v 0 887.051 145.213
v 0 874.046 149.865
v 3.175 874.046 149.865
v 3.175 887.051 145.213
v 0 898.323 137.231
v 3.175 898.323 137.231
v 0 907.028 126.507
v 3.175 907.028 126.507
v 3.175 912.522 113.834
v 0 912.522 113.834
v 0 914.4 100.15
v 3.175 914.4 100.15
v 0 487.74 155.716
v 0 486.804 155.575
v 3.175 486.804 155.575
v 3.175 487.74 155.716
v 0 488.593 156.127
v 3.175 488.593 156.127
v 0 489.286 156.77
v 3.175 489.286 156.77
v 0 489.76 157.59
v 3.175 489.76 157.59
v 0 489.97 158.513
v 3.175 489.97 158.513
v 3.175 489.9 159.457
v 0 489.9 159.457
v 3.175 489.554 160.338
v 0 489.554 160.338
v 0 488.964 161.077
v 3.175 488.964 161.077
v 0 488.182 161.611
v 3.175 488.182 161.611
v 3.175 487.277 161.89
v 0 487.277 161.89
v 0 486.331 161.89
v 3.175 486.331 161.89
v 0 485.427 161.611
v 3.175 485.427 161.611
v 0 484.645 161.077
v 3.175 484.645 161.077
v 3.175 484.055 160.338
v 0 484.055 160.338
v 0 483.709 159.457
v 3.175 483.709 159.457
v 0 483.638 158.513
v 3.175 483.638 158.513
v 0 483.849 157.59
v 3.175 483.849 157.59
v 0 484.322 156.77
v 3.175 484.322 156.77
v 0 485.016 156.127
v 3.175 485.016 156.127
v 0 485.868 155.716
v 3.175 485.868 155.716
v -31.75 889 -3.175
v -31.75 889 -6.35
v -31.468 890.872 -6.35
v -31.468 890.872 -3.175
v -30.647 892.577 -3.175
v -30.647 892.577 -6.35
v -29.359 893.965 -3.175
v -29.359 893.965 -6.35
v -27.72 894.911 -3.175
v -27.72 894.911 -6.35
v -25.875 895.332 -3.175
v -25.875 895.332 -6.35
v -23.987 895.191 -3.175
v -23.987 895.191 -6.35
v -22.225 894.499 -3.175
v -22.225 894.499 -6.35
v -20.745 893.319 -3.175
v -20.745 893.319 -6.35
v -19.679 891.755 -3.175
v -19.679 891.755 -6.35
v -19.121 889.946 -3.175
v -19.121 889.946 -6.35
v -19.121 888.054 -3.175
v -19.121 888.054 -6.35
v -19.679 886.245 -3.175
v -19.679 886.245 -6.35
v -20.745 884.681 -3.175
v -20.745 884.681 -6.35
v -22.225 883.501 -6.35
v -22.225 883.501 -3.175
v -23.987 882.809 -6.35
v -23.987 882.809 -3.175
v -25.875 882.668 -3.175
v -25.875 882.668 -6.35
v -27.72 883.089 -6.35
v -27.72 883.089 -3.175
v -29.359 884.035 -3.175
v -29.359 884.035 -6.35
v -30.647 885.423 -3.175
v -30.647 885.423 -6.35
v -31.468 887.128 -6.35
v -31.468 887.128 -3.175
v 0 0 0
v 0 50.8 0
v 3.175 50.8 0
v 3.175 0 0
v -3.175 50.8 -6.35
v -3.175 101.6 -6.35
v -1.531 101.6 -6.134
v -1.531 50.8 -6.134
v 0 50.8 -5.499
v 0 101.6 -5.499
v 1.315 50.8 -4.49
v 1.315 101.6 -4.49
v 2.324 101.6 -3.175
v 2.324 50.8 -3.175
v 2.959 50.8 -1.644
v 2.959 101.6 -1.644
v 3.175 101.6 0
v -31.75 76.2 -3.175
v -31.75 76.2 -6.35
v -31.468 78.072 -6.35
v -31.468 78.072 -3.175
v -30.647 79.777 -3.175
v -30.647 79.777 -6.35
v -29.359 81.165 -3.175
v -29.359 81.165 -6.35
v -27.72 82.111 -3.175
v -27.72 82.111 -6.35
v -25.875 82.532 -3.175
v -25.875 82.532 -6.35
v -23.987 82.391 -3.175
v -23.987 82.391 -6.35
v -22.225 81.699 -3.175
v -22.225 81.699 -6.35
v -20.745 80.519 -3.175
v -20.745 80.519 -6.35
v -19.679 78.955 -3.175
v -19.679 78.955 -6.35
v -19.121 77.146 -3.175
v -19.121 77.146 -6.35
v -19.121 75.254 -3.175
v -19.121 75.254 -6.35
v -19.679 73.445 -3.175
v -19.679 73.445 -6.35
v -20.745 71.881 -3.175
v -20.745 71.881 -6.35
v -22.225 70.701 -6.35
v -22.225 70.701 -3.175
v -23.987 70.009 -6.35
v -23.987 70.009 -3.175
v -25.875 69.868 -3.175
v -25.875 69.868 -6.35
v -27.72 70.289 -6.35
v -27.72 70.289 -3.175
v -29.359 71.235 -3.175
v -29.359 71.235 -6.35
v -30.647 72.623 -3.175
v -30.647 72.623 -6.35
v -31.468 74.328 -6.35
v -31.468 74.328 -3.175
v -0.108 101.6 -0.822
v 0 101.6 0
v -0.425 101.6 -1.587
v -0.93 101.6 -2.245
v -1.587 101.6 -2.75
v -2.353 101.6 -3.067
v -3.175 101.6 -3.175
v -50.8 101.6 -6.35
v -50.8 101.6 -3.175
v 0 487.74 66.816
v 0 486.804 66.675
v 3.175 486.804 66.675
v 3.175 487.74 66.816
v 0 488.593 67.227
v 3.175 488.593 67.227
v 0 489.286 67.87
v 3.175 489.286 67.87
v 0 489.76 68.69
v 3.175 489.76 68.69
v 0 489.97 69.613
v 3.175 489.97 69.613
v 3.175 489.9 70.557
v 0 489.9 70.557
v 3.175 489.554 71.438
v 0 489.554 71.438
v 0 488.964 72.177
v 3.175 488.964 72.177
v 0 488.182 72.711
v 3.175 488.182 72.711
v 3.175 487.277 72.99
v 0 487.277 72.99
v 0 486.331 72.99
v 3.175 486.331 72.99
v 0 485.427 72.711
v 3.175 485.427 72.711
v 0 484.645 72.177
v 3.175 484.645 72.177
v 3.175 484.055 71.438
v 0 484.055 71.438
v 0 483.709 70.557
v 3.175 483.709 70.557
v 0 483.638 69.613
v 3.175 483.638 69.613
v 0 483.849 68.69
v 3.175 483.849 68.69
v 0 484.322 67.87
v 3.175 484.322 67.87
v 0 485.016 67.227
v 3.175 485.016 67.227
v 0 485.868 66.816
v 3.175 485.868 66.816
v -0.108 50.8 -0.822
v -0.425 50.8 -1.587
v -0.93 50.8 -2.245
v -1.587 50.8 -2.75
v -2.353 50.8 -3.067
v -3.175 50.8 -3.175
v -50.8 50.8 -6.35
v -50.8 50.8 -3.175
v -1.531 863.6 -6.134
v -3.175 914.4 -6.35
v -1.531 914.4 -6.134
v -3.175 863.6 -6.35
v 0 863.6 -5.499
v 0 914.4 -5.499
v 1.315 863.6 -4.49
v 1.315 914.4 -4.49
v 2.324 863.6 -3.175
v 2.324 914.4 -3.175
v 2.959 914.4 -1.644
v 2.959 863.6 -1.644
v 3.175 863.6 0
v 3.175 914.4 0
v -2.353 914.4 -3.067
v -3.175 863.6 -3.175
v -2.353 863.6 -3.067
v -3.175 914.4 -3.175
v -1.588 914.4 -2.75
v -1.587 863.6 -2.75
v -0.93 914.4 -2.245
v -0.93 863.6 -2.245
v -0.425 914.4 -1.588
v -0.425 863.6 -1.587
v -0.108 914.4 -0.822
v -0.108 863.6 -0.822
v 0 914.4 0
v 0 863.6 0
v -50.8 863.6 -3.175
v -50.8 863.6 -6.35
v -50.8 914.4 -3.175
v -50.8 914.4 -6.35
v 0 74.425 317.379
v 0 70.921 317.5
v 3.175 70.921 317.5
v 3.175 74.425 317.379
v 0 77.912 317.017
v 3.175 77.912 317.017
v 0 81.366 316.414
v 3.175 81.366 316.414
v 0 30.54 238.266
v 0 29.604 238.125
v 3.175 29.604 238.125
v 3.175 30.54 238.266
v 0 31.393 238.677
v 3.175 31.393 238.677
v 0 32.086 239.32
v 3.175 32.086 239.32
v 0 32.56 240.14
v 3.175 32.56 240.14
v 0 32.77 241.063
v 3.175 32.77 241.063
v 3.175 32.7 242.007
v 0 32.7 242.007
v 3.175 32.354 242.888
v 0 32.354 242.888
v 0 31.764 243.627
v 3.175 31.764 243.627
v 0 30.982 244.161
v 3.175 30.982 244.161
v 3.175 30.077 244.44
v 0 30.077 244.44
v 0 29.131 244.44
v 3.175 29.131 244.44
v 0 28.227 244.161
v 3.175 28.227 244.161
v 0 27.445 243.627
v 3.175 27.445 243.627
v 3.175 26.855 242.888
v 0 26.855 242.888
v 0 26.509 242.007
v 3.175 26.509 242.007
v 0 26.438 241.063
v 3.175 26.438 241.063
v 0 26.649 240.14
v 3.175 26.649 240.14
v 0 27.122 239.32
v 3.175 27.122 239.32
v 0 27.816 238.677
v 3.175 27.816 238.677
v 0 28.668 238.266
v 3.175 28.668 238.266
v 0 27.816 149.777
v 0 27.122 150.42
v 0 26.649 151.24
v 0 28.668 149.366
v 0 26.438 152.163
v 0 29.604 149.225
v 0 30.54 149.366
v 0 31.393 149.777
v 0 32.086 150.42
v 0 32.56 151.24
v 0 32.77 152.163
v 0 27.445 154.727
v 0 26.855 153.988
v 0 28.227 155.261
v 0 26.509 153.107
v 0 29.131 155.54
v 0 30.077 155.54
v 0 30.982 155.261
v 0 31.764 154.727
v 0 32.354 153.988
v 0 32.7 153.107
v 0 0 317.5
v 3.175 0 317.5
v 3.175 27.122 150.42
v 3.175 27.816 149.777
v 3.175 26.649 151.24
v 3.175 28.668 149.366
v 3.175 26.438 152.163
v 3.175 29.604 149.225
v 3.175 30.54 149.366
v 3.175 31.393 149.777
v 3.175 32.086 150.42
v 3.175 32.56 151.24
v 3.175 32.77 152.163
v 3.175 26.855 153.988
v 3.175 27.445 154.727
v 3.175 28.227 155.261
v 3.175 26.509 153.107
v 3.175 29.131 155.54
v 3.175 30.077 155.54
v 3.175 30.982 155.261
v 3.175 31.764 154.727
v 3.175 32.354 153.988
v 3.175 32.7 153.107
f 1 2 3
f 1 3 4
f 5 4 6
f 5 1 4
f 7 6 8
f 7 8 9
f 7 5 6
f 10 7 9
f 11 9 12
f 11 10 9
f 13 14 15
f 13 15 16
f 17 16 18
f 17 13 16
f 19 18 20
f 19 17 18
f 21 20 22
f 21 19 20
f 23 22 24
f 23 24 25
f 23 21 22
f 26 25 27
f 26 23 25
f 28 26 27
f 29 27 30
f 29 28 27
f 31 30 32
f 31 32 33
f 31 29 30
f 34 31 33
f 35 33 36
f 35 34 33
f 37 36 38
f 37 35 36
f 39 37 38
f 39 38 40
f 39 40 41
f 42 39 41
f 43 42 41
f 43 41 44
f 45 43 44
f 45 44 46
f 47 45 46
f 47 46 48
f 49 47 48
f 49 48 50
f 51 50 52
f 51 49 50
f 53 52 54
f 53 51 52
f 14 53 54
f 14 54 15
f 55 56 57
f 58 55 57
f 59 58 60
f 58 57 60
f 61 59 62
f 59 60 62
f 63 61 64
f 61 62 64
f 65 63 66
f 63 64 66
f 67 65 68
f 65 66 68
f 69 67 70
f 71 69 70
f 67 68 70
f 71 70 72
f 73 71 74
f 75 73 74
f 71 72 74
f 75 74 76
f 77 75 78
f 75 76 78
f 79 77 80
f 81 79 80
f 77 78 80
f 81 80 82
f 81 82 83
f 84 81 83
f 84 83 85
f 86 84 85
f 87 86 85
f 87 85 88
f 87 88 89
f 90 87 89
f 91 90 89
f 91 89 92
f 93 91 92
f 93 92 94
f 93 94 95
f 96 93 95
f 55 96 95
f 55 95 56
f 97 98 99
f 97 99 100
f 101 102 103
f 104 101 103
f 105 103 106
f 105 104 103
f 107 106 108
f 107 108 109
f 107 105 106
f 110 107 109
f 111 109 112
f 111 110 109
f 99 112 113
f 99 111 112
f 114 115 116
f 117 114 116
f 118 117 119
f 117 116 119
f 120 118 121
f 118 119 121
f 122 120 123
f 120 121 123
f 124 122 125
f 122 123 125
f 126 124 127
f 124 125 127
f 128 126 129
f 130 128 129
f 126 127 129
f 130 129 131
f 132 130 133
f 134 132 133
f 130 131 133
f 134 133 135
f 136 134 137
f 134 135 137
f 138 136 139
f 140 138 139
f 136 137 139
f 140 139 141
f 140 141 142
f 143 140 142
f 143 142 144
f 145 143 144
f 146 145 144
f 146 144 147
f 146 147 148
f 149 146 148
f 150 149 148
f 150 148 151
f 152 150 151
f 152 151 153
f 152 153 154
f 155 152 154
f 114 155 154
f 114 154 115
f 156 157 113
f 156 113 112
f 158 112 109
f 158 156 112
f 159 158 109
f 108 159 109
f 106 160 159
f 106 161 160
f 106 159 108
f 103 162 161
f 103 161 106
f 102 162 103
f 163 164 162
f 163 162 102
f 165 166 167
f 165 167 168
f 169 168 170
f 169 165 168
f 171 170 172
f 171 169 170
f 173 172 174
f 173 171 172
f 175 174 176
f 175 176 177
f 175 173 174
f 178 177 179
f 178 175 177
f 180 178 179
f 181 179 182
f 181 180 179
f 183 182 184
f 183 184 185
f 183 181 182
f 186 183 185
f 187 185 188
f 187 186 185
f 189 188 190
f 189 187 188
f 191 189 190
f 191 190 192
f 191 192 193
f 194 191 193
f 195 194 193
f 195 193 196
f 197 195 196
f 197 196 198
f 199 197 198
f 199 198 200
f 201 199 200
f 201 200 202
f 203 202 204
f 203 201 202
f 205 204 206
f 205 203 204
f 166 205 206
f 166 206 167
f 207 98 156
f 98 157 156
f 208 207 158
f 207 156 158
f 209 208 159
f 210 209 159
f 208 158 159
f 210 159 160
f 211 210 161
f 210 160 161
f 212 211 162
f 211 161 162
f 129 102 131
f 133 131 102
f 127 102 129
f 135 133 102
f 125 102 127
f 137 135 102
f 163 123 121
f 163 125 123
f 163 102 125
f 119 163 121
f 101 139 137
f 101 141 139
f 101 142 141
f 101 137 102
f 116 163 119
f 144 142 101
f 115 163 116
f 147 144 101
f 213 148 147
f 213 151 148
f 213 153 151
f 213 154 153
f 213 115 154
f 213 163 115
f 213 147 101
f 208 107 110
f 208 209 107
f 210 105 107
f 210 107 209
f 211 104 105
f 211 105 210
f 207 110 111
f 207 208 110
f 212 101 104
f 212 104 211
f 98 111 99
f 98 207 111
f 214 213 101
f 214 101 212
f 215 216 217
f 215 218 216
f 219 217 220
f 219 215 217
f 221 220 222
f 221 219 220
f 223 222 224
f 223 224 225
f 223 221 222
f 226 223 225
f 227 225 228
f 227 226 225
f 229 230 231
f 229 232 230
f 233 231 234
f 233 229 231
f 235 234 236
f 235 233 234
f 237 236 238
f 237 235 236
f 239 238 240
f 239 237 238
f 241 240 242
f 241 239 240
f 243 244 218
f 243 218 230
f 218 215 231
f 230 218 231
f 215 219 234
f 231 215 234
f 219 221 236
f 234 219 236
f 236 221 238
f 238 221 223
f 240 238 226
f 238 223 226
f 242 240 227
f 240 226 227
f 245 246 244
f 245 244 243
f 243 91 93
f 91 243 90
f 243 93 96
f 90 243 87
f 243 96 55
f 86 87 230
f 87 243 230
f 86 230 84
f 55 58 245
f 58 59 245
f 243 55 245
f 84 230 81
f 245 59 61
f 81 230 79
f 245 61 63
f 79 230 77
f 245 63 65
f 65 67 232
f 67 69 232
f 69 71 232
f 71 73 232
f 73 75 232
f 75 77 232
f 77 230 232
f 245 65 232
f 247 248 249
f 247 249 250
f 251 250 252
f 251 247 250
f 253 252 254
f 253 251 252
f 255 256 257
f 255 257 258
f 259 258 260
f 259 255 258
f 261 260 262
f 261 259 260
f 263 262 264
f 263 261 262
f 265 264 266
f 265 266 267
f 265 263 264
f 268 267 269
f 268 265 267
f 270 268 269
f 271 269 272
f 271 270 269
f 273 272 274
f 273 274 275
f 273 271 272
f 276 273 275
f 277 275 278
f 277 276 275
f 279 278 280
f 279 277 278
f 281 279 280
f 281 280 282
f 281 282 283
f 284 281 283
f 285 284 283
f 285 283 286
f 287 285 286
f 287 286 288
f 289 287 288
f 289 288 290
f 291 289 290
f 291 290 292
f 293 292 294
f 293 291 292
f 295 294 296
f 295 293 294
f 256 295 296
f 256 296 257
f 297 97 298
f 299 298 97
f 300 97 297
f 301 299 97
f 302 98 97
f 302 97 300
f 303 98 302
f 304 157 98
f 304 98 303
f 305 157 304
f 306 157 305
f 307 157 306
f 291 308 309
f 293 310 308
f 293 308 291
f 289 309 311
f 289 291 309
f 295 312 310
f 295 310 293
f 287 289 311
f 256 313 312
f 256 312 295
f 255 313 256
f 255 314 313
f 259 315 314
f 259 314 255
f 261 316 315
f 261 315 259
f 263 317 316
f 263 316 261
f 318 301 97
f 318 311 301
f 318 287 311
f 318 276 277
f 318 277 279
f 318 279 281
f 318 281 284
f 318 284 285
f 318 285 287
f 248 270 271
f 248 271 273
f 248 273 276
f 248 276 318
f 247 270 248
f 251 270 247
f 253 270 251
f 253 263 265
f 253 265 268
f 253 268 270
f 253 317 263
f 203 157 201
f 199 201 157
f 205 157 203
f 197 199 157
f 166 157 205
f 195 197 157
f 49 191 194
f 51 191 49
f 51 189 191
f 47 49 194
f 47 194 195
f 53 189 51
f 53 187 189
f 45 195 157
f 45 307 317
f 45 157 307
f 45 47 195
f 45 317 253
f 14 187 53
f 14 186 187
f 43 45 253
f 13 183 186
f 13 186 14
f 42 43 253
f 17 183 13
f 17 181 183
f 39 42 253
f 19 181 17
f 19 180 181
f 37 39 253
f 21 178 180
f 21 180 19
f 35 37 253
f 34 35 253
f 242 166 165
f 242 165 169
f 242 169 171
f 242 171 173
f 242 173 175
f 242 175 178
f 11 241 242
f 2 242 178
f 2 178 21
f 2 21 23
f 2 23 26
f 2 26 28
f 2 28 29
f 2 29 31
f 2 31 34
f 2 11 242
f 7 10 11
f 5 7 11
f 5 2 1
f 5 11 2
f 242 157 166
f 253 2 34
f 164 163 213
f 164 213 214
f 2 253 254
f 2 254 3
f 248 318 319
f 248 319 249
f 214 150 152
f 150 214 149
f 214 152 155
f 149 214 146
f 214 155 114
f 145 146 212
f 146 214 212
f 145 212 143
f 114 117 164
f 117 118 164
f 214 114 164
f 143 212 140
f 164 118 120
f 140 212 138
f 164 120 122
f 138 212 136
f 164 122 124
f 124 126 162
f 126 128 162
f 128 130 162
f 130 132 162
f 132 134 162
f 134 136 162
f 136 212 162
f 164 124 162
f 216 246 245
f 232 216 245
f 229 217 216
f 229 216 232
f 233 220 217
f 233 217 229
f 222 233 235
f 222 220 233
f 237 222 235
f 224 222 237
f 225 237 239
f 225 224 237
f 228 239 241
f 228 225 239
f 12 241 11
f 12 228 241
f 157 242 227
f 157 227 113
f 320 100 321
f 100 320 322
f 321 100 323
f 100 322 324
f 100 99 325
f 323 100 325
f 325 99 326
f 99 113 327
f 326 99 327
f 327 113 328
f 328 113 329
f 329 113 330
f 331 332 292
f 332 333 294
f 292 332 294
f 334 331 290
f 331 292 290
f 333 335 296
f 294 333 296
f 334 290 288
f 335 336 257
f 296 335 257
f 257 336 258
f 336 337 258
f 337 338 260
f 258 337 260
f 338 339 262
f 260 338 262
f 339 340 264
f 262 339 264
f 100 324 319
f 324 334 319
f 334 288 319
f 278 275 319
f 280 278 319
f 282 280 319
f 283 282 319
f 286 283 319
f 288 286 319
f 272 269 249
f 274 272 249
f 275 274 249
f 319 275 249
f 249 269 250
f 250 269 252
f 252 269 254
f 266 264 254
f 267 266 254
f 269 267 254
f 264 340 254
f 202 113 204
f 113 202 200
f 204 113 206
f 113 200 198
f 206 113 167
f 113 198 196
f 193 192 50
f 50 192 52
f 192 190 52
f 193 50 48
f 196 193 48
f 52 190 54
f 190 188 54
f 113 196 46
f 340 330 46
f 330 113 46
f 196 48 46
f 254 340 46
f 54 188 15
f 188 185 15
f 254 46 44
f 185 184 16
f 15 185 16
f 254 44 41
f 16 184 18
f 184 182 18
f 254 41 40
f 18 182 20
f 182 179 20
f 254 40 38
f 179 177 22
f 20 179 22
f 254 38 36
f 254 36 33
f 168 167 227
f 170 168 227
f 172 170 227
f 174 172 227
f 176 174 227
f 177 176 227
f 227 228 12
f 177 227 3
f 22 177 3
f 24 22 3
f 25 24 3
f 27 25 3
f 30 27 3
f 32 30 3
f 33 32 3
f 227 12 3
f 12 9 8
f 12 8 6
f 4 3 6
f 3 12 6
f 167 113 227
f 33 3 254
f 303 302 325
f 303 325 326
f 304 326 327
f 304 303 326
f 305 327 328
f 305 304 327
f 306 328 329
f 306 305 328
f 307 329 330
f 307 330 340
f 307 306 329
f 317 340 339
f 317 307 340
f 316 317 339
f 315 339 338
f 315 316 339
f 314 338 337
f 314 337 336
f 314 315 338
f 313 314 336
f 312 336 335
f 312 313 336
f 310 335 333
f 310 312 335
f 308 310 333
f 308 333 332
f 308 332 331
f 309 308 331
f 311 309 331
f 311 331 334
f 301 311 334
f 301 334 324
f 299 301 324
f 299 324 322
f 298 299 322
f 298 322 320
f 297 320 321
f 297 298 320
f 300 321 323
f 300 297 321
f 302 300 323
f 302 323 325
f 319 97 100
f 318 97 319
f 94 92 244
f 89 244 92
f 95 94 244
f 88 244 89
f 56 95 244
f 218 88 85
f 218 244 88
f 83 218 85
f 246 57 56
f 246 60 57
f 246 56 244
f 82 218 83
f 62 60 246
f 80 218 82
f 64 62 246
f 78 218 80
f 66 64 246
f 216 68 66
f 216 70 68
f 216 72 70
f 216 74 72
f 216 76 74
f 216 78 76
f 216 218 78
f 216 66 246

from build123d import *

# Parameters (mm, degrees)
BOSS_EXTRUDE2_DEPTH        = 3.175
SKETCH2_W                  = 3.175
SKETCH2_H                  = 50.8
BOSS_EXTRUDE3_DEPTH        = 50.8
FILLET3_R                  = 6.35
F_1_2_0_5_DIAMETER_HOLE1_D = 12.7
FILLET4_R                  = 3.175


with BuildPart() as part:
    # Sketch1 → Boss-Extrude2 (new body)
    with BuildSketch(Plane(origin=(0, 0, 0), x_dir=(0, 0, -1), z_dir=(1, 0, 0))):
        with BuildLine():
            Line((-317.5, 0), (0, 0))
            Line((0, 0), (0, 50.8))
            Line((0, 50.8), (6.35, 50.8))
            Line((6.35, 50.8), (6.35, 101.6))
            Line((6.35, 101.6), (0, 101.6))
            Line((0, 101.6), (0, 559.756235294))
            Line((0, 559.756235294), (0, 863.6))
            Line((0, 863.6), (6.35, 863.6))
            Line((6.35, 863.6), (6.35, 914.4))
            Line((6.35, 914.4), (-100.150182785, 914.4))
            ThreePointArc((-100.150182785, 914.4), (-132.16586597, 903.041552077), (-149.864680249, 874.045513001))
            Line((-149.864680249, 874.045513001), (-316.414497465, 81.366353538))
            ThreePointArc((-316.414497465, 81.366353538), (-317.227895618, 76.171722787), (-317.5, 70.920840537))
            Line((-317.5, 70.920840537), (-317.5, 0))
        make_face()
        with BuildLine():
            ThreePointArc((-244.475, 29.604131036), (-241.3, 32.779131036), (-238.125, 29.604131036))
            ThreePointArc((-238.125, 29.604131036), (-241.3, 26.429131036), (-244.475, 29.604131036))
        make_face(mode=Mode.SUBTRACT)
        with BuildLine():
            ThreePointArc((-149.225, 29.604131036), (-152.4, 26.429131036), (-155.575, 29.604131036))
            ThreePointArc((-155.575, 29.604131036), (-152.4, 32.779131036), (-149.225, 29.604131036))
        make_face(mode=Mode.SUBTRACT)
        with BuildLine():
            ThreePointArc((-161.925, 486.804131036), (-158.75, 489.979131036), (-155.575, 486.804131036))
            ThreePointArc((-155.575, 486.804131036), (-158.75, 483.629131036), (-161.925, 486.804131036))
        make_face(mode=Mode.SUBTRACT)
        with BuildLine():
            ThreePointArc((-66.675, 486.804131036), (-69.85, 483.629131036), (-73.025, 486.804131036))
            ThreePointArc((-73.025, 486.804131036), (-69.85, 489.979131036), (-66.675, 486.804131036))
        make_face(mode=Mode.SUBTRACT)
    extrude(amount=BOSS_EXTRUDE2_DEPTH)

    # Sketch2 → Boss-Extrude3 (add)
    with BuildSketch(Plane.ZY):
        with Locations((-4.7625, 889)):
            Rectangle(SKETCH2_W, SKETCH2_H)
        with Locations((-4.7625, 76.2)):
            Rectangle(SKETCH2_W, SKETCH2_H)
    extrude(amount=BOSS_EXTRUDE3_DEPTH)

    # Fillet3
    fillet3_edges = [part.edges().sort_by_distance(p)[0] for p in [
        (3.175, 76.2, -6.35),
        (3.175, 889, -6.35),
    ]]
    fillet(fillet3_edges, radius=FILLET3_R)

    # 1/2 (0.5) Diameter Hole1 (through all)
    with Locations(Plane.XY.offset(-3.175)):
        with Locations((-25.4, 76.2), (-25.4, 889)):
            Hole(F_1_2_0_5_DIAMETER_HOLE1_D / 2)

    # Fillet4
    fillet4_edges = [part.edges().sort_by_distance(p)[0] for p in [
        (0, 889, -3.175),
        (0, 76.2, -3.175),
    ]]
    fillet(fillet4_edges, radius=FILLET4_R)


solid = part.part
